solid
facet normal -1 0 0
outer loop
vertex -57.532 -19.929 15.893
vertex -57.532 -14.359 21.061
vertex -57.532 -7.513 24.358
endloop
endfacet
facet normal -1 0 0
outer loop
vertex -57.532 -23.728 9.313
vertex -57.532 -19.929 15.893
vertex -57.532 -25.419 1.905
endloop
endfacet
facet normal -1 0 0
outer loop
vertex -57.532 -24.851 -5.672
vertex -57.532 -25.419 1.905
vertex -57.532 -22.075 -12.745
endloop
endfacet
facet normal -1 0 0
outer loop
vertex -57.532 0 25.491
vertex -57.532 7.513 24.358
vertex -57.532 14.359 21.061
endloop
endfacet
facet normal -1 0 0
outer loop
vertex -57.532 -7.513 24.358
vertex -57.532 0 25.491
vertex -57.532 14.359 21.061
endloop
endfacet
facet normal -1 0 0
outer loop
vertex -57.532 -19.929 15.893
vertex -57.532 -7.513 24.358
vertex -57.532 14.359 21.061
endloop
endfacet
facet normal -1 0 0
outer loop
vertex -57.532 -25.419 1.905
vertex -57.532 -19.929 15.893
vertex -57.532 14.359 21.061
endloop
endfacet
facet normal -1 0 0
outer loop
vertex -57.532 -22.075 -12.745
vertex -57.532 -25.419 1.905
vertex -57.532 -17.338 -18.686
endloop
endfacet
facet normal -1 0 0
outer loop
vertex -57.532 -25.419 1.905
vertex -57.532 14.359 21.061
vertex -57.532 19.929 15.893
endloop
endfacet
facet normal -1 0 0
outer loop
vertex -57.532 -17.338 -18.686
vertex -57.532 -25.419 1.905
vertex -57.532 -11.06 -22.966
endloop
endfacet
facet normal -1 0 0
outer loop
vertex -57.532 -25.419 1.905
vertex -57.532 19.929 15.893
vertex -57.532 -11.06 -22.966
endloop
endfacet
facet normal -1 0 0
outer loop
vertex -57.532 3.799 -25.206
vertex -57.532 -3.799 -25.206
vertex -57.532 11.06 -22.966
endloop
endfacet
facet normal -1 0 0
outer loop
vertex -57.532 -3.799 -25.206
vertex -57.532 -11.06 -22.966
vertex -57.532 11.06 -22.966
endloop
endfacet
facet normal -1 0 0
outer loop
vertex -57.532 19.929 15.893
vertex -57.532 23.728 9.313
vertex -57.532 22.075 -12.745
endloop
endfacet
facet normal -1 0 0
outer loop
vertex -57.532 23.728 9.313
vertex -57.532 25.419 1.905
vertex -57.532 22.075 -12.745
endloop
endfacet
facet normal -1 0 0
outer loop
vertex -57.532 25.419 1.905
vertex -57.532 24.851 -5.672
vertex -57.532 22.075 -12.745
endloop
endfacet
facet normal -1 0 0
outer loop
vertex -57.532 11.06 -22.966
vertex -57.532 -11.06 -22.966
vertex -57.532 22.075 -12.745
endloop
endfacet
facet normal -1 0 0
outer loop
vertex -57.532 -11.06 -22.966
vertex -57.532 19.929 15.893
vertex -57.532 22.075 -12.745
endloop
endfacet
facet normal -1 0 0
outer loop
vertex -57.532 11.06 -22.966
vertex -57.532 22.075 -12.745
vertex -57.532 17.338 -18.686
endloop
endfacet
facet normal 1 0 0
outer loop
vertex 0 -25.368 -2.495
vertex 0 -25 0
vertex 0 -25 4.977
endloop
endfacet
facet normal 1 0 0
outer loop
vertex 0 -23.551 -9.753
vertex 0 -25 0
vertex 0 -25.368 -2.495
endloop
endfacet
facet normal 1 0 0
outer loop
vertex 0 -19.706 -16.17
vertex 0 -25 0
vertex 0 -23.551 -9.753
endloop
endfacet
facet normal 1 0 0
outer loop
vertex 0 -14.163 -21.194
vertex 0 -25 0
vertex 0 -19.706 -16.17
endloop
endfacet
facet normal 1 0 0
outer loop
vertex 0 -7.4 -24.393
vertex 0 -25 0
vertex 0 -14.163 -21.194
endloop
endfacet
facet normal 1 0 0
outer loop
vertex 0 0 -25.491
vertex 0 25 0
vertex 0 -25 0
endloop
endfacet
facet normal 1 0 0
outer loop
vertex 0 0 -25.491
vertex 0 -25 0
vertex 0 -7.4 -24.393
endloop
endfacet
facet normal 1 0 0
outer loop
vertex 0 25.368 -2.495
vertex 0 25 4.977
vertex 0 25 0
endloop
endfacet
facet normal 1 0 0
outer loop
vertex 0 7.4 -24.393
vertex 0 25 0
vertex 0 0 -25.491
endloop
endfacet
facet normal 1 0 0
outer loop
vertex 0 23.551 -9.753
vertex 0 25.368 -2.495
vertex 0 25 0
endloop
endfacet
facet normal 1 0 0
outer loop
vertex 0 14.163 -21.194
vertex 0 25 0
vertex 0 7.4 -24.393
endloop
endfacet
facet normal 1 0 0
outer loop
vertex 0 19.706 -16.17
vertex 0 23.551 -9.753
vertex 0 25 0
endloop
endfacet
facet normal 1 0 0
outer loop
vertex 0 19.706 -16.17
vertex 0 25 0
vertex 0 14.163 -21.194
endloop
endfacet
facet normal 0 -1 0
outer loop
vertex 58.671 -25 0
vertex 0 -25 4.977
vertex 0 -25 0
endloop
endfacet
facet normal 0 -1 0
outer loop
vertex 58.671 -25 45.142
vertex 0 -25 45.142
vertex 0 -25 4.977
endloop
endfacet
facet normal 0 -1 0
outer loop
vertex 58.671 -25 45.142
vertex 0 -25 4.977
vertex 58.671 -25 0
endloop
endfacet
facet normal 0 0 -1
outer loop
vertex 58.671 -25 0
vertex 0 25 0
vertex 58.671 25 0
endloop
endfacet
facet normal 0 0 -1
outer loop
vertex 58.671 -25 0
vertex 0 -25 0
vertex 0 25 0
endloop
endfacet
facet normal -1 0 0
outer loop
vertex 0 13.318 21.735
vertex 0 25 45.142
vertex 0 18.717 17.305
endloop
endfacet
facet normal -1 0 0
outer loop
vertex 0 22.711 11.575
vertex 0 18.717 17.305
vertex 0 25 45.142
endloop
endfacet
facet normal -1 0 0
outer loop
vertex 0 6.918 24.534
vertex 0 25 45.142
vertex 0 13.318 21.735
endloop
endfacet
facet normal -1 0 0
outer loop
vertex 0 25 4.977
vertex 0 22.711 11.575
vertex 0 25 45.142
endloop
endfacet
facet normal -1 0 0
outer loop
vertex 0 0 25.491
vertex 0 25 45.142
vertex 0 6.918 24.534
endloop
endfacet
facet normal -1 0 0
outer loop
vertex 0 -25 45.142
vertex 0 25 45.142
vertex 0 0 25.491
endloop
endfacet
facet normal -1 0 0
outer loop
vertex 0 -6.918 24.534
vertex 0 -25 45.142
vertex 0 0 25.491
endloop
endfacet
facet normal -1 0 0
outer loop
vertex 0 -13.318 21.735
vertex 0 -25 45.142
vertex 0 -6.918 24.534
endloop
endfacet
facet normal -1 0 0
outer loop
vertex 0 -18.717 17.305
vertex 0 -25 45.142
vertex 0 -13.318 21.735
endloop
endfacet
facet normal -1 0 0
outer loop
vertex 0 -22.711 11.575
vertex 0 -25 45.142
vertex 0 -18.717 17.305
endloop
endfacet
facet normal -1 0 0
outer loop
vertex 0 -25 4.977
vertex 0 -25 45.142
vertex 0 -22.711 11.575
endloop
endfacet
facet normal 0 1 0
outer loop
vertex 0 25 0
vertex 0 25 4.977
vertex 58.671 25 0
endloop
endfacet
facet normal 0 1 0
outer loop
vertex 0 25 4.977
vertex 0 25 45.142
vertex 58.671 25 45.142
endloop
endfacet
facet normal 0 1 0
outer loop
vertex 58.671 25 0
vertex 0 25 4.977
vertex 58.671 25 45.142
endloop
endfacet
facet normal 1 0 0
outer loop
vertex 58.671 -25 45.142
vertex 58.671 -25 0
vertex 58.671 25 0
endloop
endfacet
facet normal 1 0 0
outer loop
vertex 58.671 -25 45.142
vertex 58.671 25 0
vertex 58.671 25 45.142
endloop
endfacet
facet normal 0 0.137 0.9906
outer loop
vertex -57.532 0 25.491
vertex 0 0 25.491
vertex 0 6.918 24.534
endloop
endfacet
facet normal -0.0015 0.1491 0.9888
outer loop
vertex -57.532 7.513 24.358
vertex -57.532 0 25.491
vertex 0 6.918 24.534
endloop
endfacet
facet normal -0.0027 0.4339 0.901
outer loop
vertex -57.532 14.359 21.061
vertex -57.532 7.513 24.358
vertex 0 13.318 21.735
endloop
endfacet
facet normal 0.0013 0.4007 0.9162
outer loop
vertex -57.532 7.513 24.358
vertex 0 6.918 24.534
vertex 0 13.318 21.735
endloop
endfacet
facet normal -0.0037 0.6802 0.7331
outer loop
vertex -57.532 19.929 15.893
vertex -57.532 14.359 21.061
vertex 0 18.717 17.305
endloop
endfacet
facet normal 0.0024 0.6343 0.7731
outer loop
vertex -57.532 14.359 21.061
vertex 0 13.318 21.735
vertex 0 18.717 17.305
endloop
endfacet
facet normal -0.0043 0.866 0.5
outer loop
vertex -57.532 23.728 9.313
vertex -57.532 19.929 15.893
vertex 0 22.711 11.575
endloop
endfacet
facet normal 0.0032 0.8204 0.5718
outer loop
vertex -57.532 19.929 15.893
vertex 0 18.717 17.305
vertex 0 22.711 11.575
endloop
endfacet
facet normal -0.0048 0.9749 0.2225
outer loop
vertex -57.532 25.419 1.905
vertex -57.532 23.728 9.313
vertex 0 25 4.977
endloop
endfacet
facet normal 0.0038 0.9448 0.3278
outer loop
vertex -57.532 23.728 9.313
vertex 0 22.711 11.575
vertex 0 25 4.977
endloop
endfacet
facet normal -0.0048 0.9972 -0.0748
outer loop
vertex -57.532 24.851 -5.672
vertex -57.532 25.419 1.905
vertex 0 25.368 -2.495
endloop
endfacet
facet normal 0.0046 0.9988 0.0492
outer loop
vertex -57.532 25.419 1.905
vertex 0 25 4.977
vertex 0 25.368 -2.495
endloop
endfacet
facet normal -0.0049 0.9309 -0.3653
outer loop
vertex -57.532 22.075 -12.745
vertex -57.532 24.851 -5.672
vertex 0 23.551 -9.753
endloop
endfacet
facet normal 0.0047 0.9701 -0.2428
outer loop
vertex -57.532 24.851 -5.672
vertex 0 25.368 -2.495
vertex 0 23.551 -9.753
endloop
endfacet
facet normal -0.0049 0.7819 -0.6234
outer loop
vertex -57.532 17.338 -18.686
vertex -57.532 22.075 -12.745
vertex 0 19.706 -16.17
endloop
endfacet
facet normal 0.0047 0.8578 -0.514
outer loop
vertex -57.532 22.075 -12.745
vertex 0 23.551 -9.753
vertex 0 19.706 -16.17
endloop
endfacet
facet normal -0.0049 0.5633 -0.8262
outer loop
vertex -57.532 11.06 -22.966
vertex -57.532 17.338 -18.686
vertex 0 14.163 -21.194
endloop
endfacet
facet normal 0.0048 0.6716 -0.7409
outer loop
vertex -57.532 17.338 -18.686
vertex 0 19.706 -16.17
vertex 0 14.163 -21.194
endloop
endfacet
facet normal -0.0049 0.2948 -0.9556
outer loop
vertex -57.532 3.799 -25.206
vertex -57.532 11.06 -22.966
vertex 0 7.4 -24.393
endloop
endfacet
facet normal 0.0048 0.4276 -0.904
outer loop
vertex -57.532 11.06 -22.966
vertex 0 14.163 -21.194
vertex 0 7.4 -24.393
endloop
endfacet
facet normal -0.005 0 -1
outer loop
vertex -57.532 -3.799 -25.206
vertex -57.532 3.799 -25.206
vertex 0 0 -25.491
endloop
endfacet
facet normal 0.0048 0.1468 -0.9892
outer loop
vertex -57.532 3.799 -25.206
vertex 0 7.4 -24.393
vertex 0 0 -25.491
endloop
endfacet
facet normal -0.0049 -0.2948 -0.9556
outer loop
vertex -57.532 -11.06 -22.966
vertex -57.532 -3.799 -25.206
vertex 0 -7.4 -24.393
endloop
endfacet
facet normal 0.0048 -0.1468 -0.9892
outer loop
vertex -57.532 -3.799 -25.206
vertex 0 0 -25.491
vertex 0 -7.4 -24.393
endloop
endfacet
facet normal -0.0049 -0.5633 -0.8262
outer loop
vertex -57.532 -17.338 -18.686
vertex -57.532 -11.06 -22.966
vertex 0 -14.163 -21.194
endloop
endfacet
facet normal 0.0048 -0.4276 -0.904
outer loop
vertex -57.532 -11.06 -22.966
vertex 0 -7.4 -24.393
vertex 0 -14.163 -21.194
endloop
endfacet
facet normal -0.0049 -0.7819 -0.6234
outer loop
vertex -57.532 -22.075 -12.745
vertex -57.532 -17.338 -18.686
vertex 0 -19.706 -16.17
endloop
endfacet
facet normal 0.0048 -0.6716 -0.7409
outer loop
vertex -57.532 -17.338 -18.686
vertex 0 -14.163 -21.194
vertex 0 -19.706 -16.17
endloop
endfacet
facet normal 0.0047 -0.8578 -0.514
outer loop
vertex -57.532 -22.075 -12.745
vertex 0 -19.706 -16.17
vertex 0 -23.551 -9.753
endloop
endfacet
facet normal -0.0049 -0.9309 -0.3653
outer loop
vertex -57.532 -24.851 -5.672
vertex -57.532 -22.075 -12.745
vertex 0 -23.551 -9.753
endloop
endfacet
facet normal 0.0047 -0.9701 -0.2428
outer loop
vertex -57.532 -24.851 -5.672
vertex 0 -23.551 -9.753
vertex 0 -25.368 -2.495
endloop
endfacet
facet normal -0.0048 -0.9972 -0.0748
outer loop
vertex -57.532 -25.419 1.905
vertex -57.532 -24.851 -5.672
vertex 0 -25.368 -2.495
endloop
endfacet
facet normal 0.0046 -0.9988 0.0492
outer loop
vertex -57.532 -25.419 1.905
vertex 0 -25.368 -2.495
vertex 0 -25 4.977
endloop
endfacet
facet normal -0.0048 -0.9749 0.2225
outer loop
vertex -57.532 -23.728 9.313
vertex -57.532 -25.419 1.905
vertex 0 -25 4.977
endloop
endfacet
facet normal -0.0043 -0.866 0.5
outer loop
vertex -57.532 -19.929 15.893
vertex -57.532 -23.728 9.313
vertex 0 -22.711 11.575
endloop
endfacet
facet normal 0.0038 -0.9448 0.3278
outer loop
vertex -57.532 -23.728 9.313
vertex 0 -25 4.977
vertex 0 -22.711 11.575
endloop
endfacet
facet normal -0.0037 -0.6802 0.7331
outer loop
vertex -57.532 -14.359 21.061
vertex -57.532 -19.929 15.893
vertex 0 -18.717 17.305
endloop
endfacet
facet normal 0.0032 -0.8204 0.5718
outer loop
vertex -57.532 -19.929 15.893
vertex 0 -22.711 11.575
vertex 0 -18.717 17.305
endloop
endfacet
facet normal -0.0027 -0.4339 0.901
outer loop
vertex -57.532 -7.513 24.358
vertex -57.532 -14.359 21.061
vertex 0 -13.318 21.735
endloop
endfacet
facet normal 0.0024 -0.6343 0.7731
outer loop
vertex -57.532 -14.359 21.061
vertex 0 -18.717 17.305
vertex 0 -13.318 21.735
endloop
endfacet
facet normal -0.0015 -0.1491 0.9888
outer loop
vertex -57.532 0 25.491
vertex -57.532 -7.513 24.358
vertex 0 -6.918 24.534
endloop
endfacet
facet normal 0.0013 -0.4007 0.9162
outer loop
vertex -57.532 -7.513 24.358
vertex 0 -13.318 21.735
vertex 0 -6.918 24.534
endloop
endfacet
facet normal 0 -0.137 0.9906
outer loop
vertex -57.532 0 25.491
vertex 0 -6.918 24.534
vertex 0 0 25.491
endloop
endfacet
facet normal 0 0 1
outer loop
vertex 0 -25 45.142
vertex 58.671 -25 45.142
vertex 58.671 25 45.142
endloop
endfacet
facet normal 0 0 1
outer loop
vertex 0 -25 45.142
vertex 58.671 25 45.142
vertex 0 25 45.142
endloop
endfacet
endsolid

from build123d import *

# Parameters (mm, degrees)
F1_DEPTH = 25
F0_W     = 57.5316473842
F0_H     = 25.4905093461


with BuildPart() as f1:
    # F0 (on Front) → F1 (new body, symmetric)
    with BuildSketch(Plane.XZ):
        Polygon((0, 25.4905093461), (0, 0), (58.6708895862, 0), (58.6708895862, 45.1424047351), (0, 45.1424047351), align=None)
    extrude(amount=F1_DEPTH, both=True)

    # F0 (on Front) → F2 (revolve)
    with BuildSketch(Plane.XZ):
        with Locations((-28.7658236921, 12.7452546731)):
            Rectangle(F0_W, F0_H)
    revolve(axis=Axis((-28.7658236921, 0, 0), (-1, 0, 0)))


solid = f1.part
